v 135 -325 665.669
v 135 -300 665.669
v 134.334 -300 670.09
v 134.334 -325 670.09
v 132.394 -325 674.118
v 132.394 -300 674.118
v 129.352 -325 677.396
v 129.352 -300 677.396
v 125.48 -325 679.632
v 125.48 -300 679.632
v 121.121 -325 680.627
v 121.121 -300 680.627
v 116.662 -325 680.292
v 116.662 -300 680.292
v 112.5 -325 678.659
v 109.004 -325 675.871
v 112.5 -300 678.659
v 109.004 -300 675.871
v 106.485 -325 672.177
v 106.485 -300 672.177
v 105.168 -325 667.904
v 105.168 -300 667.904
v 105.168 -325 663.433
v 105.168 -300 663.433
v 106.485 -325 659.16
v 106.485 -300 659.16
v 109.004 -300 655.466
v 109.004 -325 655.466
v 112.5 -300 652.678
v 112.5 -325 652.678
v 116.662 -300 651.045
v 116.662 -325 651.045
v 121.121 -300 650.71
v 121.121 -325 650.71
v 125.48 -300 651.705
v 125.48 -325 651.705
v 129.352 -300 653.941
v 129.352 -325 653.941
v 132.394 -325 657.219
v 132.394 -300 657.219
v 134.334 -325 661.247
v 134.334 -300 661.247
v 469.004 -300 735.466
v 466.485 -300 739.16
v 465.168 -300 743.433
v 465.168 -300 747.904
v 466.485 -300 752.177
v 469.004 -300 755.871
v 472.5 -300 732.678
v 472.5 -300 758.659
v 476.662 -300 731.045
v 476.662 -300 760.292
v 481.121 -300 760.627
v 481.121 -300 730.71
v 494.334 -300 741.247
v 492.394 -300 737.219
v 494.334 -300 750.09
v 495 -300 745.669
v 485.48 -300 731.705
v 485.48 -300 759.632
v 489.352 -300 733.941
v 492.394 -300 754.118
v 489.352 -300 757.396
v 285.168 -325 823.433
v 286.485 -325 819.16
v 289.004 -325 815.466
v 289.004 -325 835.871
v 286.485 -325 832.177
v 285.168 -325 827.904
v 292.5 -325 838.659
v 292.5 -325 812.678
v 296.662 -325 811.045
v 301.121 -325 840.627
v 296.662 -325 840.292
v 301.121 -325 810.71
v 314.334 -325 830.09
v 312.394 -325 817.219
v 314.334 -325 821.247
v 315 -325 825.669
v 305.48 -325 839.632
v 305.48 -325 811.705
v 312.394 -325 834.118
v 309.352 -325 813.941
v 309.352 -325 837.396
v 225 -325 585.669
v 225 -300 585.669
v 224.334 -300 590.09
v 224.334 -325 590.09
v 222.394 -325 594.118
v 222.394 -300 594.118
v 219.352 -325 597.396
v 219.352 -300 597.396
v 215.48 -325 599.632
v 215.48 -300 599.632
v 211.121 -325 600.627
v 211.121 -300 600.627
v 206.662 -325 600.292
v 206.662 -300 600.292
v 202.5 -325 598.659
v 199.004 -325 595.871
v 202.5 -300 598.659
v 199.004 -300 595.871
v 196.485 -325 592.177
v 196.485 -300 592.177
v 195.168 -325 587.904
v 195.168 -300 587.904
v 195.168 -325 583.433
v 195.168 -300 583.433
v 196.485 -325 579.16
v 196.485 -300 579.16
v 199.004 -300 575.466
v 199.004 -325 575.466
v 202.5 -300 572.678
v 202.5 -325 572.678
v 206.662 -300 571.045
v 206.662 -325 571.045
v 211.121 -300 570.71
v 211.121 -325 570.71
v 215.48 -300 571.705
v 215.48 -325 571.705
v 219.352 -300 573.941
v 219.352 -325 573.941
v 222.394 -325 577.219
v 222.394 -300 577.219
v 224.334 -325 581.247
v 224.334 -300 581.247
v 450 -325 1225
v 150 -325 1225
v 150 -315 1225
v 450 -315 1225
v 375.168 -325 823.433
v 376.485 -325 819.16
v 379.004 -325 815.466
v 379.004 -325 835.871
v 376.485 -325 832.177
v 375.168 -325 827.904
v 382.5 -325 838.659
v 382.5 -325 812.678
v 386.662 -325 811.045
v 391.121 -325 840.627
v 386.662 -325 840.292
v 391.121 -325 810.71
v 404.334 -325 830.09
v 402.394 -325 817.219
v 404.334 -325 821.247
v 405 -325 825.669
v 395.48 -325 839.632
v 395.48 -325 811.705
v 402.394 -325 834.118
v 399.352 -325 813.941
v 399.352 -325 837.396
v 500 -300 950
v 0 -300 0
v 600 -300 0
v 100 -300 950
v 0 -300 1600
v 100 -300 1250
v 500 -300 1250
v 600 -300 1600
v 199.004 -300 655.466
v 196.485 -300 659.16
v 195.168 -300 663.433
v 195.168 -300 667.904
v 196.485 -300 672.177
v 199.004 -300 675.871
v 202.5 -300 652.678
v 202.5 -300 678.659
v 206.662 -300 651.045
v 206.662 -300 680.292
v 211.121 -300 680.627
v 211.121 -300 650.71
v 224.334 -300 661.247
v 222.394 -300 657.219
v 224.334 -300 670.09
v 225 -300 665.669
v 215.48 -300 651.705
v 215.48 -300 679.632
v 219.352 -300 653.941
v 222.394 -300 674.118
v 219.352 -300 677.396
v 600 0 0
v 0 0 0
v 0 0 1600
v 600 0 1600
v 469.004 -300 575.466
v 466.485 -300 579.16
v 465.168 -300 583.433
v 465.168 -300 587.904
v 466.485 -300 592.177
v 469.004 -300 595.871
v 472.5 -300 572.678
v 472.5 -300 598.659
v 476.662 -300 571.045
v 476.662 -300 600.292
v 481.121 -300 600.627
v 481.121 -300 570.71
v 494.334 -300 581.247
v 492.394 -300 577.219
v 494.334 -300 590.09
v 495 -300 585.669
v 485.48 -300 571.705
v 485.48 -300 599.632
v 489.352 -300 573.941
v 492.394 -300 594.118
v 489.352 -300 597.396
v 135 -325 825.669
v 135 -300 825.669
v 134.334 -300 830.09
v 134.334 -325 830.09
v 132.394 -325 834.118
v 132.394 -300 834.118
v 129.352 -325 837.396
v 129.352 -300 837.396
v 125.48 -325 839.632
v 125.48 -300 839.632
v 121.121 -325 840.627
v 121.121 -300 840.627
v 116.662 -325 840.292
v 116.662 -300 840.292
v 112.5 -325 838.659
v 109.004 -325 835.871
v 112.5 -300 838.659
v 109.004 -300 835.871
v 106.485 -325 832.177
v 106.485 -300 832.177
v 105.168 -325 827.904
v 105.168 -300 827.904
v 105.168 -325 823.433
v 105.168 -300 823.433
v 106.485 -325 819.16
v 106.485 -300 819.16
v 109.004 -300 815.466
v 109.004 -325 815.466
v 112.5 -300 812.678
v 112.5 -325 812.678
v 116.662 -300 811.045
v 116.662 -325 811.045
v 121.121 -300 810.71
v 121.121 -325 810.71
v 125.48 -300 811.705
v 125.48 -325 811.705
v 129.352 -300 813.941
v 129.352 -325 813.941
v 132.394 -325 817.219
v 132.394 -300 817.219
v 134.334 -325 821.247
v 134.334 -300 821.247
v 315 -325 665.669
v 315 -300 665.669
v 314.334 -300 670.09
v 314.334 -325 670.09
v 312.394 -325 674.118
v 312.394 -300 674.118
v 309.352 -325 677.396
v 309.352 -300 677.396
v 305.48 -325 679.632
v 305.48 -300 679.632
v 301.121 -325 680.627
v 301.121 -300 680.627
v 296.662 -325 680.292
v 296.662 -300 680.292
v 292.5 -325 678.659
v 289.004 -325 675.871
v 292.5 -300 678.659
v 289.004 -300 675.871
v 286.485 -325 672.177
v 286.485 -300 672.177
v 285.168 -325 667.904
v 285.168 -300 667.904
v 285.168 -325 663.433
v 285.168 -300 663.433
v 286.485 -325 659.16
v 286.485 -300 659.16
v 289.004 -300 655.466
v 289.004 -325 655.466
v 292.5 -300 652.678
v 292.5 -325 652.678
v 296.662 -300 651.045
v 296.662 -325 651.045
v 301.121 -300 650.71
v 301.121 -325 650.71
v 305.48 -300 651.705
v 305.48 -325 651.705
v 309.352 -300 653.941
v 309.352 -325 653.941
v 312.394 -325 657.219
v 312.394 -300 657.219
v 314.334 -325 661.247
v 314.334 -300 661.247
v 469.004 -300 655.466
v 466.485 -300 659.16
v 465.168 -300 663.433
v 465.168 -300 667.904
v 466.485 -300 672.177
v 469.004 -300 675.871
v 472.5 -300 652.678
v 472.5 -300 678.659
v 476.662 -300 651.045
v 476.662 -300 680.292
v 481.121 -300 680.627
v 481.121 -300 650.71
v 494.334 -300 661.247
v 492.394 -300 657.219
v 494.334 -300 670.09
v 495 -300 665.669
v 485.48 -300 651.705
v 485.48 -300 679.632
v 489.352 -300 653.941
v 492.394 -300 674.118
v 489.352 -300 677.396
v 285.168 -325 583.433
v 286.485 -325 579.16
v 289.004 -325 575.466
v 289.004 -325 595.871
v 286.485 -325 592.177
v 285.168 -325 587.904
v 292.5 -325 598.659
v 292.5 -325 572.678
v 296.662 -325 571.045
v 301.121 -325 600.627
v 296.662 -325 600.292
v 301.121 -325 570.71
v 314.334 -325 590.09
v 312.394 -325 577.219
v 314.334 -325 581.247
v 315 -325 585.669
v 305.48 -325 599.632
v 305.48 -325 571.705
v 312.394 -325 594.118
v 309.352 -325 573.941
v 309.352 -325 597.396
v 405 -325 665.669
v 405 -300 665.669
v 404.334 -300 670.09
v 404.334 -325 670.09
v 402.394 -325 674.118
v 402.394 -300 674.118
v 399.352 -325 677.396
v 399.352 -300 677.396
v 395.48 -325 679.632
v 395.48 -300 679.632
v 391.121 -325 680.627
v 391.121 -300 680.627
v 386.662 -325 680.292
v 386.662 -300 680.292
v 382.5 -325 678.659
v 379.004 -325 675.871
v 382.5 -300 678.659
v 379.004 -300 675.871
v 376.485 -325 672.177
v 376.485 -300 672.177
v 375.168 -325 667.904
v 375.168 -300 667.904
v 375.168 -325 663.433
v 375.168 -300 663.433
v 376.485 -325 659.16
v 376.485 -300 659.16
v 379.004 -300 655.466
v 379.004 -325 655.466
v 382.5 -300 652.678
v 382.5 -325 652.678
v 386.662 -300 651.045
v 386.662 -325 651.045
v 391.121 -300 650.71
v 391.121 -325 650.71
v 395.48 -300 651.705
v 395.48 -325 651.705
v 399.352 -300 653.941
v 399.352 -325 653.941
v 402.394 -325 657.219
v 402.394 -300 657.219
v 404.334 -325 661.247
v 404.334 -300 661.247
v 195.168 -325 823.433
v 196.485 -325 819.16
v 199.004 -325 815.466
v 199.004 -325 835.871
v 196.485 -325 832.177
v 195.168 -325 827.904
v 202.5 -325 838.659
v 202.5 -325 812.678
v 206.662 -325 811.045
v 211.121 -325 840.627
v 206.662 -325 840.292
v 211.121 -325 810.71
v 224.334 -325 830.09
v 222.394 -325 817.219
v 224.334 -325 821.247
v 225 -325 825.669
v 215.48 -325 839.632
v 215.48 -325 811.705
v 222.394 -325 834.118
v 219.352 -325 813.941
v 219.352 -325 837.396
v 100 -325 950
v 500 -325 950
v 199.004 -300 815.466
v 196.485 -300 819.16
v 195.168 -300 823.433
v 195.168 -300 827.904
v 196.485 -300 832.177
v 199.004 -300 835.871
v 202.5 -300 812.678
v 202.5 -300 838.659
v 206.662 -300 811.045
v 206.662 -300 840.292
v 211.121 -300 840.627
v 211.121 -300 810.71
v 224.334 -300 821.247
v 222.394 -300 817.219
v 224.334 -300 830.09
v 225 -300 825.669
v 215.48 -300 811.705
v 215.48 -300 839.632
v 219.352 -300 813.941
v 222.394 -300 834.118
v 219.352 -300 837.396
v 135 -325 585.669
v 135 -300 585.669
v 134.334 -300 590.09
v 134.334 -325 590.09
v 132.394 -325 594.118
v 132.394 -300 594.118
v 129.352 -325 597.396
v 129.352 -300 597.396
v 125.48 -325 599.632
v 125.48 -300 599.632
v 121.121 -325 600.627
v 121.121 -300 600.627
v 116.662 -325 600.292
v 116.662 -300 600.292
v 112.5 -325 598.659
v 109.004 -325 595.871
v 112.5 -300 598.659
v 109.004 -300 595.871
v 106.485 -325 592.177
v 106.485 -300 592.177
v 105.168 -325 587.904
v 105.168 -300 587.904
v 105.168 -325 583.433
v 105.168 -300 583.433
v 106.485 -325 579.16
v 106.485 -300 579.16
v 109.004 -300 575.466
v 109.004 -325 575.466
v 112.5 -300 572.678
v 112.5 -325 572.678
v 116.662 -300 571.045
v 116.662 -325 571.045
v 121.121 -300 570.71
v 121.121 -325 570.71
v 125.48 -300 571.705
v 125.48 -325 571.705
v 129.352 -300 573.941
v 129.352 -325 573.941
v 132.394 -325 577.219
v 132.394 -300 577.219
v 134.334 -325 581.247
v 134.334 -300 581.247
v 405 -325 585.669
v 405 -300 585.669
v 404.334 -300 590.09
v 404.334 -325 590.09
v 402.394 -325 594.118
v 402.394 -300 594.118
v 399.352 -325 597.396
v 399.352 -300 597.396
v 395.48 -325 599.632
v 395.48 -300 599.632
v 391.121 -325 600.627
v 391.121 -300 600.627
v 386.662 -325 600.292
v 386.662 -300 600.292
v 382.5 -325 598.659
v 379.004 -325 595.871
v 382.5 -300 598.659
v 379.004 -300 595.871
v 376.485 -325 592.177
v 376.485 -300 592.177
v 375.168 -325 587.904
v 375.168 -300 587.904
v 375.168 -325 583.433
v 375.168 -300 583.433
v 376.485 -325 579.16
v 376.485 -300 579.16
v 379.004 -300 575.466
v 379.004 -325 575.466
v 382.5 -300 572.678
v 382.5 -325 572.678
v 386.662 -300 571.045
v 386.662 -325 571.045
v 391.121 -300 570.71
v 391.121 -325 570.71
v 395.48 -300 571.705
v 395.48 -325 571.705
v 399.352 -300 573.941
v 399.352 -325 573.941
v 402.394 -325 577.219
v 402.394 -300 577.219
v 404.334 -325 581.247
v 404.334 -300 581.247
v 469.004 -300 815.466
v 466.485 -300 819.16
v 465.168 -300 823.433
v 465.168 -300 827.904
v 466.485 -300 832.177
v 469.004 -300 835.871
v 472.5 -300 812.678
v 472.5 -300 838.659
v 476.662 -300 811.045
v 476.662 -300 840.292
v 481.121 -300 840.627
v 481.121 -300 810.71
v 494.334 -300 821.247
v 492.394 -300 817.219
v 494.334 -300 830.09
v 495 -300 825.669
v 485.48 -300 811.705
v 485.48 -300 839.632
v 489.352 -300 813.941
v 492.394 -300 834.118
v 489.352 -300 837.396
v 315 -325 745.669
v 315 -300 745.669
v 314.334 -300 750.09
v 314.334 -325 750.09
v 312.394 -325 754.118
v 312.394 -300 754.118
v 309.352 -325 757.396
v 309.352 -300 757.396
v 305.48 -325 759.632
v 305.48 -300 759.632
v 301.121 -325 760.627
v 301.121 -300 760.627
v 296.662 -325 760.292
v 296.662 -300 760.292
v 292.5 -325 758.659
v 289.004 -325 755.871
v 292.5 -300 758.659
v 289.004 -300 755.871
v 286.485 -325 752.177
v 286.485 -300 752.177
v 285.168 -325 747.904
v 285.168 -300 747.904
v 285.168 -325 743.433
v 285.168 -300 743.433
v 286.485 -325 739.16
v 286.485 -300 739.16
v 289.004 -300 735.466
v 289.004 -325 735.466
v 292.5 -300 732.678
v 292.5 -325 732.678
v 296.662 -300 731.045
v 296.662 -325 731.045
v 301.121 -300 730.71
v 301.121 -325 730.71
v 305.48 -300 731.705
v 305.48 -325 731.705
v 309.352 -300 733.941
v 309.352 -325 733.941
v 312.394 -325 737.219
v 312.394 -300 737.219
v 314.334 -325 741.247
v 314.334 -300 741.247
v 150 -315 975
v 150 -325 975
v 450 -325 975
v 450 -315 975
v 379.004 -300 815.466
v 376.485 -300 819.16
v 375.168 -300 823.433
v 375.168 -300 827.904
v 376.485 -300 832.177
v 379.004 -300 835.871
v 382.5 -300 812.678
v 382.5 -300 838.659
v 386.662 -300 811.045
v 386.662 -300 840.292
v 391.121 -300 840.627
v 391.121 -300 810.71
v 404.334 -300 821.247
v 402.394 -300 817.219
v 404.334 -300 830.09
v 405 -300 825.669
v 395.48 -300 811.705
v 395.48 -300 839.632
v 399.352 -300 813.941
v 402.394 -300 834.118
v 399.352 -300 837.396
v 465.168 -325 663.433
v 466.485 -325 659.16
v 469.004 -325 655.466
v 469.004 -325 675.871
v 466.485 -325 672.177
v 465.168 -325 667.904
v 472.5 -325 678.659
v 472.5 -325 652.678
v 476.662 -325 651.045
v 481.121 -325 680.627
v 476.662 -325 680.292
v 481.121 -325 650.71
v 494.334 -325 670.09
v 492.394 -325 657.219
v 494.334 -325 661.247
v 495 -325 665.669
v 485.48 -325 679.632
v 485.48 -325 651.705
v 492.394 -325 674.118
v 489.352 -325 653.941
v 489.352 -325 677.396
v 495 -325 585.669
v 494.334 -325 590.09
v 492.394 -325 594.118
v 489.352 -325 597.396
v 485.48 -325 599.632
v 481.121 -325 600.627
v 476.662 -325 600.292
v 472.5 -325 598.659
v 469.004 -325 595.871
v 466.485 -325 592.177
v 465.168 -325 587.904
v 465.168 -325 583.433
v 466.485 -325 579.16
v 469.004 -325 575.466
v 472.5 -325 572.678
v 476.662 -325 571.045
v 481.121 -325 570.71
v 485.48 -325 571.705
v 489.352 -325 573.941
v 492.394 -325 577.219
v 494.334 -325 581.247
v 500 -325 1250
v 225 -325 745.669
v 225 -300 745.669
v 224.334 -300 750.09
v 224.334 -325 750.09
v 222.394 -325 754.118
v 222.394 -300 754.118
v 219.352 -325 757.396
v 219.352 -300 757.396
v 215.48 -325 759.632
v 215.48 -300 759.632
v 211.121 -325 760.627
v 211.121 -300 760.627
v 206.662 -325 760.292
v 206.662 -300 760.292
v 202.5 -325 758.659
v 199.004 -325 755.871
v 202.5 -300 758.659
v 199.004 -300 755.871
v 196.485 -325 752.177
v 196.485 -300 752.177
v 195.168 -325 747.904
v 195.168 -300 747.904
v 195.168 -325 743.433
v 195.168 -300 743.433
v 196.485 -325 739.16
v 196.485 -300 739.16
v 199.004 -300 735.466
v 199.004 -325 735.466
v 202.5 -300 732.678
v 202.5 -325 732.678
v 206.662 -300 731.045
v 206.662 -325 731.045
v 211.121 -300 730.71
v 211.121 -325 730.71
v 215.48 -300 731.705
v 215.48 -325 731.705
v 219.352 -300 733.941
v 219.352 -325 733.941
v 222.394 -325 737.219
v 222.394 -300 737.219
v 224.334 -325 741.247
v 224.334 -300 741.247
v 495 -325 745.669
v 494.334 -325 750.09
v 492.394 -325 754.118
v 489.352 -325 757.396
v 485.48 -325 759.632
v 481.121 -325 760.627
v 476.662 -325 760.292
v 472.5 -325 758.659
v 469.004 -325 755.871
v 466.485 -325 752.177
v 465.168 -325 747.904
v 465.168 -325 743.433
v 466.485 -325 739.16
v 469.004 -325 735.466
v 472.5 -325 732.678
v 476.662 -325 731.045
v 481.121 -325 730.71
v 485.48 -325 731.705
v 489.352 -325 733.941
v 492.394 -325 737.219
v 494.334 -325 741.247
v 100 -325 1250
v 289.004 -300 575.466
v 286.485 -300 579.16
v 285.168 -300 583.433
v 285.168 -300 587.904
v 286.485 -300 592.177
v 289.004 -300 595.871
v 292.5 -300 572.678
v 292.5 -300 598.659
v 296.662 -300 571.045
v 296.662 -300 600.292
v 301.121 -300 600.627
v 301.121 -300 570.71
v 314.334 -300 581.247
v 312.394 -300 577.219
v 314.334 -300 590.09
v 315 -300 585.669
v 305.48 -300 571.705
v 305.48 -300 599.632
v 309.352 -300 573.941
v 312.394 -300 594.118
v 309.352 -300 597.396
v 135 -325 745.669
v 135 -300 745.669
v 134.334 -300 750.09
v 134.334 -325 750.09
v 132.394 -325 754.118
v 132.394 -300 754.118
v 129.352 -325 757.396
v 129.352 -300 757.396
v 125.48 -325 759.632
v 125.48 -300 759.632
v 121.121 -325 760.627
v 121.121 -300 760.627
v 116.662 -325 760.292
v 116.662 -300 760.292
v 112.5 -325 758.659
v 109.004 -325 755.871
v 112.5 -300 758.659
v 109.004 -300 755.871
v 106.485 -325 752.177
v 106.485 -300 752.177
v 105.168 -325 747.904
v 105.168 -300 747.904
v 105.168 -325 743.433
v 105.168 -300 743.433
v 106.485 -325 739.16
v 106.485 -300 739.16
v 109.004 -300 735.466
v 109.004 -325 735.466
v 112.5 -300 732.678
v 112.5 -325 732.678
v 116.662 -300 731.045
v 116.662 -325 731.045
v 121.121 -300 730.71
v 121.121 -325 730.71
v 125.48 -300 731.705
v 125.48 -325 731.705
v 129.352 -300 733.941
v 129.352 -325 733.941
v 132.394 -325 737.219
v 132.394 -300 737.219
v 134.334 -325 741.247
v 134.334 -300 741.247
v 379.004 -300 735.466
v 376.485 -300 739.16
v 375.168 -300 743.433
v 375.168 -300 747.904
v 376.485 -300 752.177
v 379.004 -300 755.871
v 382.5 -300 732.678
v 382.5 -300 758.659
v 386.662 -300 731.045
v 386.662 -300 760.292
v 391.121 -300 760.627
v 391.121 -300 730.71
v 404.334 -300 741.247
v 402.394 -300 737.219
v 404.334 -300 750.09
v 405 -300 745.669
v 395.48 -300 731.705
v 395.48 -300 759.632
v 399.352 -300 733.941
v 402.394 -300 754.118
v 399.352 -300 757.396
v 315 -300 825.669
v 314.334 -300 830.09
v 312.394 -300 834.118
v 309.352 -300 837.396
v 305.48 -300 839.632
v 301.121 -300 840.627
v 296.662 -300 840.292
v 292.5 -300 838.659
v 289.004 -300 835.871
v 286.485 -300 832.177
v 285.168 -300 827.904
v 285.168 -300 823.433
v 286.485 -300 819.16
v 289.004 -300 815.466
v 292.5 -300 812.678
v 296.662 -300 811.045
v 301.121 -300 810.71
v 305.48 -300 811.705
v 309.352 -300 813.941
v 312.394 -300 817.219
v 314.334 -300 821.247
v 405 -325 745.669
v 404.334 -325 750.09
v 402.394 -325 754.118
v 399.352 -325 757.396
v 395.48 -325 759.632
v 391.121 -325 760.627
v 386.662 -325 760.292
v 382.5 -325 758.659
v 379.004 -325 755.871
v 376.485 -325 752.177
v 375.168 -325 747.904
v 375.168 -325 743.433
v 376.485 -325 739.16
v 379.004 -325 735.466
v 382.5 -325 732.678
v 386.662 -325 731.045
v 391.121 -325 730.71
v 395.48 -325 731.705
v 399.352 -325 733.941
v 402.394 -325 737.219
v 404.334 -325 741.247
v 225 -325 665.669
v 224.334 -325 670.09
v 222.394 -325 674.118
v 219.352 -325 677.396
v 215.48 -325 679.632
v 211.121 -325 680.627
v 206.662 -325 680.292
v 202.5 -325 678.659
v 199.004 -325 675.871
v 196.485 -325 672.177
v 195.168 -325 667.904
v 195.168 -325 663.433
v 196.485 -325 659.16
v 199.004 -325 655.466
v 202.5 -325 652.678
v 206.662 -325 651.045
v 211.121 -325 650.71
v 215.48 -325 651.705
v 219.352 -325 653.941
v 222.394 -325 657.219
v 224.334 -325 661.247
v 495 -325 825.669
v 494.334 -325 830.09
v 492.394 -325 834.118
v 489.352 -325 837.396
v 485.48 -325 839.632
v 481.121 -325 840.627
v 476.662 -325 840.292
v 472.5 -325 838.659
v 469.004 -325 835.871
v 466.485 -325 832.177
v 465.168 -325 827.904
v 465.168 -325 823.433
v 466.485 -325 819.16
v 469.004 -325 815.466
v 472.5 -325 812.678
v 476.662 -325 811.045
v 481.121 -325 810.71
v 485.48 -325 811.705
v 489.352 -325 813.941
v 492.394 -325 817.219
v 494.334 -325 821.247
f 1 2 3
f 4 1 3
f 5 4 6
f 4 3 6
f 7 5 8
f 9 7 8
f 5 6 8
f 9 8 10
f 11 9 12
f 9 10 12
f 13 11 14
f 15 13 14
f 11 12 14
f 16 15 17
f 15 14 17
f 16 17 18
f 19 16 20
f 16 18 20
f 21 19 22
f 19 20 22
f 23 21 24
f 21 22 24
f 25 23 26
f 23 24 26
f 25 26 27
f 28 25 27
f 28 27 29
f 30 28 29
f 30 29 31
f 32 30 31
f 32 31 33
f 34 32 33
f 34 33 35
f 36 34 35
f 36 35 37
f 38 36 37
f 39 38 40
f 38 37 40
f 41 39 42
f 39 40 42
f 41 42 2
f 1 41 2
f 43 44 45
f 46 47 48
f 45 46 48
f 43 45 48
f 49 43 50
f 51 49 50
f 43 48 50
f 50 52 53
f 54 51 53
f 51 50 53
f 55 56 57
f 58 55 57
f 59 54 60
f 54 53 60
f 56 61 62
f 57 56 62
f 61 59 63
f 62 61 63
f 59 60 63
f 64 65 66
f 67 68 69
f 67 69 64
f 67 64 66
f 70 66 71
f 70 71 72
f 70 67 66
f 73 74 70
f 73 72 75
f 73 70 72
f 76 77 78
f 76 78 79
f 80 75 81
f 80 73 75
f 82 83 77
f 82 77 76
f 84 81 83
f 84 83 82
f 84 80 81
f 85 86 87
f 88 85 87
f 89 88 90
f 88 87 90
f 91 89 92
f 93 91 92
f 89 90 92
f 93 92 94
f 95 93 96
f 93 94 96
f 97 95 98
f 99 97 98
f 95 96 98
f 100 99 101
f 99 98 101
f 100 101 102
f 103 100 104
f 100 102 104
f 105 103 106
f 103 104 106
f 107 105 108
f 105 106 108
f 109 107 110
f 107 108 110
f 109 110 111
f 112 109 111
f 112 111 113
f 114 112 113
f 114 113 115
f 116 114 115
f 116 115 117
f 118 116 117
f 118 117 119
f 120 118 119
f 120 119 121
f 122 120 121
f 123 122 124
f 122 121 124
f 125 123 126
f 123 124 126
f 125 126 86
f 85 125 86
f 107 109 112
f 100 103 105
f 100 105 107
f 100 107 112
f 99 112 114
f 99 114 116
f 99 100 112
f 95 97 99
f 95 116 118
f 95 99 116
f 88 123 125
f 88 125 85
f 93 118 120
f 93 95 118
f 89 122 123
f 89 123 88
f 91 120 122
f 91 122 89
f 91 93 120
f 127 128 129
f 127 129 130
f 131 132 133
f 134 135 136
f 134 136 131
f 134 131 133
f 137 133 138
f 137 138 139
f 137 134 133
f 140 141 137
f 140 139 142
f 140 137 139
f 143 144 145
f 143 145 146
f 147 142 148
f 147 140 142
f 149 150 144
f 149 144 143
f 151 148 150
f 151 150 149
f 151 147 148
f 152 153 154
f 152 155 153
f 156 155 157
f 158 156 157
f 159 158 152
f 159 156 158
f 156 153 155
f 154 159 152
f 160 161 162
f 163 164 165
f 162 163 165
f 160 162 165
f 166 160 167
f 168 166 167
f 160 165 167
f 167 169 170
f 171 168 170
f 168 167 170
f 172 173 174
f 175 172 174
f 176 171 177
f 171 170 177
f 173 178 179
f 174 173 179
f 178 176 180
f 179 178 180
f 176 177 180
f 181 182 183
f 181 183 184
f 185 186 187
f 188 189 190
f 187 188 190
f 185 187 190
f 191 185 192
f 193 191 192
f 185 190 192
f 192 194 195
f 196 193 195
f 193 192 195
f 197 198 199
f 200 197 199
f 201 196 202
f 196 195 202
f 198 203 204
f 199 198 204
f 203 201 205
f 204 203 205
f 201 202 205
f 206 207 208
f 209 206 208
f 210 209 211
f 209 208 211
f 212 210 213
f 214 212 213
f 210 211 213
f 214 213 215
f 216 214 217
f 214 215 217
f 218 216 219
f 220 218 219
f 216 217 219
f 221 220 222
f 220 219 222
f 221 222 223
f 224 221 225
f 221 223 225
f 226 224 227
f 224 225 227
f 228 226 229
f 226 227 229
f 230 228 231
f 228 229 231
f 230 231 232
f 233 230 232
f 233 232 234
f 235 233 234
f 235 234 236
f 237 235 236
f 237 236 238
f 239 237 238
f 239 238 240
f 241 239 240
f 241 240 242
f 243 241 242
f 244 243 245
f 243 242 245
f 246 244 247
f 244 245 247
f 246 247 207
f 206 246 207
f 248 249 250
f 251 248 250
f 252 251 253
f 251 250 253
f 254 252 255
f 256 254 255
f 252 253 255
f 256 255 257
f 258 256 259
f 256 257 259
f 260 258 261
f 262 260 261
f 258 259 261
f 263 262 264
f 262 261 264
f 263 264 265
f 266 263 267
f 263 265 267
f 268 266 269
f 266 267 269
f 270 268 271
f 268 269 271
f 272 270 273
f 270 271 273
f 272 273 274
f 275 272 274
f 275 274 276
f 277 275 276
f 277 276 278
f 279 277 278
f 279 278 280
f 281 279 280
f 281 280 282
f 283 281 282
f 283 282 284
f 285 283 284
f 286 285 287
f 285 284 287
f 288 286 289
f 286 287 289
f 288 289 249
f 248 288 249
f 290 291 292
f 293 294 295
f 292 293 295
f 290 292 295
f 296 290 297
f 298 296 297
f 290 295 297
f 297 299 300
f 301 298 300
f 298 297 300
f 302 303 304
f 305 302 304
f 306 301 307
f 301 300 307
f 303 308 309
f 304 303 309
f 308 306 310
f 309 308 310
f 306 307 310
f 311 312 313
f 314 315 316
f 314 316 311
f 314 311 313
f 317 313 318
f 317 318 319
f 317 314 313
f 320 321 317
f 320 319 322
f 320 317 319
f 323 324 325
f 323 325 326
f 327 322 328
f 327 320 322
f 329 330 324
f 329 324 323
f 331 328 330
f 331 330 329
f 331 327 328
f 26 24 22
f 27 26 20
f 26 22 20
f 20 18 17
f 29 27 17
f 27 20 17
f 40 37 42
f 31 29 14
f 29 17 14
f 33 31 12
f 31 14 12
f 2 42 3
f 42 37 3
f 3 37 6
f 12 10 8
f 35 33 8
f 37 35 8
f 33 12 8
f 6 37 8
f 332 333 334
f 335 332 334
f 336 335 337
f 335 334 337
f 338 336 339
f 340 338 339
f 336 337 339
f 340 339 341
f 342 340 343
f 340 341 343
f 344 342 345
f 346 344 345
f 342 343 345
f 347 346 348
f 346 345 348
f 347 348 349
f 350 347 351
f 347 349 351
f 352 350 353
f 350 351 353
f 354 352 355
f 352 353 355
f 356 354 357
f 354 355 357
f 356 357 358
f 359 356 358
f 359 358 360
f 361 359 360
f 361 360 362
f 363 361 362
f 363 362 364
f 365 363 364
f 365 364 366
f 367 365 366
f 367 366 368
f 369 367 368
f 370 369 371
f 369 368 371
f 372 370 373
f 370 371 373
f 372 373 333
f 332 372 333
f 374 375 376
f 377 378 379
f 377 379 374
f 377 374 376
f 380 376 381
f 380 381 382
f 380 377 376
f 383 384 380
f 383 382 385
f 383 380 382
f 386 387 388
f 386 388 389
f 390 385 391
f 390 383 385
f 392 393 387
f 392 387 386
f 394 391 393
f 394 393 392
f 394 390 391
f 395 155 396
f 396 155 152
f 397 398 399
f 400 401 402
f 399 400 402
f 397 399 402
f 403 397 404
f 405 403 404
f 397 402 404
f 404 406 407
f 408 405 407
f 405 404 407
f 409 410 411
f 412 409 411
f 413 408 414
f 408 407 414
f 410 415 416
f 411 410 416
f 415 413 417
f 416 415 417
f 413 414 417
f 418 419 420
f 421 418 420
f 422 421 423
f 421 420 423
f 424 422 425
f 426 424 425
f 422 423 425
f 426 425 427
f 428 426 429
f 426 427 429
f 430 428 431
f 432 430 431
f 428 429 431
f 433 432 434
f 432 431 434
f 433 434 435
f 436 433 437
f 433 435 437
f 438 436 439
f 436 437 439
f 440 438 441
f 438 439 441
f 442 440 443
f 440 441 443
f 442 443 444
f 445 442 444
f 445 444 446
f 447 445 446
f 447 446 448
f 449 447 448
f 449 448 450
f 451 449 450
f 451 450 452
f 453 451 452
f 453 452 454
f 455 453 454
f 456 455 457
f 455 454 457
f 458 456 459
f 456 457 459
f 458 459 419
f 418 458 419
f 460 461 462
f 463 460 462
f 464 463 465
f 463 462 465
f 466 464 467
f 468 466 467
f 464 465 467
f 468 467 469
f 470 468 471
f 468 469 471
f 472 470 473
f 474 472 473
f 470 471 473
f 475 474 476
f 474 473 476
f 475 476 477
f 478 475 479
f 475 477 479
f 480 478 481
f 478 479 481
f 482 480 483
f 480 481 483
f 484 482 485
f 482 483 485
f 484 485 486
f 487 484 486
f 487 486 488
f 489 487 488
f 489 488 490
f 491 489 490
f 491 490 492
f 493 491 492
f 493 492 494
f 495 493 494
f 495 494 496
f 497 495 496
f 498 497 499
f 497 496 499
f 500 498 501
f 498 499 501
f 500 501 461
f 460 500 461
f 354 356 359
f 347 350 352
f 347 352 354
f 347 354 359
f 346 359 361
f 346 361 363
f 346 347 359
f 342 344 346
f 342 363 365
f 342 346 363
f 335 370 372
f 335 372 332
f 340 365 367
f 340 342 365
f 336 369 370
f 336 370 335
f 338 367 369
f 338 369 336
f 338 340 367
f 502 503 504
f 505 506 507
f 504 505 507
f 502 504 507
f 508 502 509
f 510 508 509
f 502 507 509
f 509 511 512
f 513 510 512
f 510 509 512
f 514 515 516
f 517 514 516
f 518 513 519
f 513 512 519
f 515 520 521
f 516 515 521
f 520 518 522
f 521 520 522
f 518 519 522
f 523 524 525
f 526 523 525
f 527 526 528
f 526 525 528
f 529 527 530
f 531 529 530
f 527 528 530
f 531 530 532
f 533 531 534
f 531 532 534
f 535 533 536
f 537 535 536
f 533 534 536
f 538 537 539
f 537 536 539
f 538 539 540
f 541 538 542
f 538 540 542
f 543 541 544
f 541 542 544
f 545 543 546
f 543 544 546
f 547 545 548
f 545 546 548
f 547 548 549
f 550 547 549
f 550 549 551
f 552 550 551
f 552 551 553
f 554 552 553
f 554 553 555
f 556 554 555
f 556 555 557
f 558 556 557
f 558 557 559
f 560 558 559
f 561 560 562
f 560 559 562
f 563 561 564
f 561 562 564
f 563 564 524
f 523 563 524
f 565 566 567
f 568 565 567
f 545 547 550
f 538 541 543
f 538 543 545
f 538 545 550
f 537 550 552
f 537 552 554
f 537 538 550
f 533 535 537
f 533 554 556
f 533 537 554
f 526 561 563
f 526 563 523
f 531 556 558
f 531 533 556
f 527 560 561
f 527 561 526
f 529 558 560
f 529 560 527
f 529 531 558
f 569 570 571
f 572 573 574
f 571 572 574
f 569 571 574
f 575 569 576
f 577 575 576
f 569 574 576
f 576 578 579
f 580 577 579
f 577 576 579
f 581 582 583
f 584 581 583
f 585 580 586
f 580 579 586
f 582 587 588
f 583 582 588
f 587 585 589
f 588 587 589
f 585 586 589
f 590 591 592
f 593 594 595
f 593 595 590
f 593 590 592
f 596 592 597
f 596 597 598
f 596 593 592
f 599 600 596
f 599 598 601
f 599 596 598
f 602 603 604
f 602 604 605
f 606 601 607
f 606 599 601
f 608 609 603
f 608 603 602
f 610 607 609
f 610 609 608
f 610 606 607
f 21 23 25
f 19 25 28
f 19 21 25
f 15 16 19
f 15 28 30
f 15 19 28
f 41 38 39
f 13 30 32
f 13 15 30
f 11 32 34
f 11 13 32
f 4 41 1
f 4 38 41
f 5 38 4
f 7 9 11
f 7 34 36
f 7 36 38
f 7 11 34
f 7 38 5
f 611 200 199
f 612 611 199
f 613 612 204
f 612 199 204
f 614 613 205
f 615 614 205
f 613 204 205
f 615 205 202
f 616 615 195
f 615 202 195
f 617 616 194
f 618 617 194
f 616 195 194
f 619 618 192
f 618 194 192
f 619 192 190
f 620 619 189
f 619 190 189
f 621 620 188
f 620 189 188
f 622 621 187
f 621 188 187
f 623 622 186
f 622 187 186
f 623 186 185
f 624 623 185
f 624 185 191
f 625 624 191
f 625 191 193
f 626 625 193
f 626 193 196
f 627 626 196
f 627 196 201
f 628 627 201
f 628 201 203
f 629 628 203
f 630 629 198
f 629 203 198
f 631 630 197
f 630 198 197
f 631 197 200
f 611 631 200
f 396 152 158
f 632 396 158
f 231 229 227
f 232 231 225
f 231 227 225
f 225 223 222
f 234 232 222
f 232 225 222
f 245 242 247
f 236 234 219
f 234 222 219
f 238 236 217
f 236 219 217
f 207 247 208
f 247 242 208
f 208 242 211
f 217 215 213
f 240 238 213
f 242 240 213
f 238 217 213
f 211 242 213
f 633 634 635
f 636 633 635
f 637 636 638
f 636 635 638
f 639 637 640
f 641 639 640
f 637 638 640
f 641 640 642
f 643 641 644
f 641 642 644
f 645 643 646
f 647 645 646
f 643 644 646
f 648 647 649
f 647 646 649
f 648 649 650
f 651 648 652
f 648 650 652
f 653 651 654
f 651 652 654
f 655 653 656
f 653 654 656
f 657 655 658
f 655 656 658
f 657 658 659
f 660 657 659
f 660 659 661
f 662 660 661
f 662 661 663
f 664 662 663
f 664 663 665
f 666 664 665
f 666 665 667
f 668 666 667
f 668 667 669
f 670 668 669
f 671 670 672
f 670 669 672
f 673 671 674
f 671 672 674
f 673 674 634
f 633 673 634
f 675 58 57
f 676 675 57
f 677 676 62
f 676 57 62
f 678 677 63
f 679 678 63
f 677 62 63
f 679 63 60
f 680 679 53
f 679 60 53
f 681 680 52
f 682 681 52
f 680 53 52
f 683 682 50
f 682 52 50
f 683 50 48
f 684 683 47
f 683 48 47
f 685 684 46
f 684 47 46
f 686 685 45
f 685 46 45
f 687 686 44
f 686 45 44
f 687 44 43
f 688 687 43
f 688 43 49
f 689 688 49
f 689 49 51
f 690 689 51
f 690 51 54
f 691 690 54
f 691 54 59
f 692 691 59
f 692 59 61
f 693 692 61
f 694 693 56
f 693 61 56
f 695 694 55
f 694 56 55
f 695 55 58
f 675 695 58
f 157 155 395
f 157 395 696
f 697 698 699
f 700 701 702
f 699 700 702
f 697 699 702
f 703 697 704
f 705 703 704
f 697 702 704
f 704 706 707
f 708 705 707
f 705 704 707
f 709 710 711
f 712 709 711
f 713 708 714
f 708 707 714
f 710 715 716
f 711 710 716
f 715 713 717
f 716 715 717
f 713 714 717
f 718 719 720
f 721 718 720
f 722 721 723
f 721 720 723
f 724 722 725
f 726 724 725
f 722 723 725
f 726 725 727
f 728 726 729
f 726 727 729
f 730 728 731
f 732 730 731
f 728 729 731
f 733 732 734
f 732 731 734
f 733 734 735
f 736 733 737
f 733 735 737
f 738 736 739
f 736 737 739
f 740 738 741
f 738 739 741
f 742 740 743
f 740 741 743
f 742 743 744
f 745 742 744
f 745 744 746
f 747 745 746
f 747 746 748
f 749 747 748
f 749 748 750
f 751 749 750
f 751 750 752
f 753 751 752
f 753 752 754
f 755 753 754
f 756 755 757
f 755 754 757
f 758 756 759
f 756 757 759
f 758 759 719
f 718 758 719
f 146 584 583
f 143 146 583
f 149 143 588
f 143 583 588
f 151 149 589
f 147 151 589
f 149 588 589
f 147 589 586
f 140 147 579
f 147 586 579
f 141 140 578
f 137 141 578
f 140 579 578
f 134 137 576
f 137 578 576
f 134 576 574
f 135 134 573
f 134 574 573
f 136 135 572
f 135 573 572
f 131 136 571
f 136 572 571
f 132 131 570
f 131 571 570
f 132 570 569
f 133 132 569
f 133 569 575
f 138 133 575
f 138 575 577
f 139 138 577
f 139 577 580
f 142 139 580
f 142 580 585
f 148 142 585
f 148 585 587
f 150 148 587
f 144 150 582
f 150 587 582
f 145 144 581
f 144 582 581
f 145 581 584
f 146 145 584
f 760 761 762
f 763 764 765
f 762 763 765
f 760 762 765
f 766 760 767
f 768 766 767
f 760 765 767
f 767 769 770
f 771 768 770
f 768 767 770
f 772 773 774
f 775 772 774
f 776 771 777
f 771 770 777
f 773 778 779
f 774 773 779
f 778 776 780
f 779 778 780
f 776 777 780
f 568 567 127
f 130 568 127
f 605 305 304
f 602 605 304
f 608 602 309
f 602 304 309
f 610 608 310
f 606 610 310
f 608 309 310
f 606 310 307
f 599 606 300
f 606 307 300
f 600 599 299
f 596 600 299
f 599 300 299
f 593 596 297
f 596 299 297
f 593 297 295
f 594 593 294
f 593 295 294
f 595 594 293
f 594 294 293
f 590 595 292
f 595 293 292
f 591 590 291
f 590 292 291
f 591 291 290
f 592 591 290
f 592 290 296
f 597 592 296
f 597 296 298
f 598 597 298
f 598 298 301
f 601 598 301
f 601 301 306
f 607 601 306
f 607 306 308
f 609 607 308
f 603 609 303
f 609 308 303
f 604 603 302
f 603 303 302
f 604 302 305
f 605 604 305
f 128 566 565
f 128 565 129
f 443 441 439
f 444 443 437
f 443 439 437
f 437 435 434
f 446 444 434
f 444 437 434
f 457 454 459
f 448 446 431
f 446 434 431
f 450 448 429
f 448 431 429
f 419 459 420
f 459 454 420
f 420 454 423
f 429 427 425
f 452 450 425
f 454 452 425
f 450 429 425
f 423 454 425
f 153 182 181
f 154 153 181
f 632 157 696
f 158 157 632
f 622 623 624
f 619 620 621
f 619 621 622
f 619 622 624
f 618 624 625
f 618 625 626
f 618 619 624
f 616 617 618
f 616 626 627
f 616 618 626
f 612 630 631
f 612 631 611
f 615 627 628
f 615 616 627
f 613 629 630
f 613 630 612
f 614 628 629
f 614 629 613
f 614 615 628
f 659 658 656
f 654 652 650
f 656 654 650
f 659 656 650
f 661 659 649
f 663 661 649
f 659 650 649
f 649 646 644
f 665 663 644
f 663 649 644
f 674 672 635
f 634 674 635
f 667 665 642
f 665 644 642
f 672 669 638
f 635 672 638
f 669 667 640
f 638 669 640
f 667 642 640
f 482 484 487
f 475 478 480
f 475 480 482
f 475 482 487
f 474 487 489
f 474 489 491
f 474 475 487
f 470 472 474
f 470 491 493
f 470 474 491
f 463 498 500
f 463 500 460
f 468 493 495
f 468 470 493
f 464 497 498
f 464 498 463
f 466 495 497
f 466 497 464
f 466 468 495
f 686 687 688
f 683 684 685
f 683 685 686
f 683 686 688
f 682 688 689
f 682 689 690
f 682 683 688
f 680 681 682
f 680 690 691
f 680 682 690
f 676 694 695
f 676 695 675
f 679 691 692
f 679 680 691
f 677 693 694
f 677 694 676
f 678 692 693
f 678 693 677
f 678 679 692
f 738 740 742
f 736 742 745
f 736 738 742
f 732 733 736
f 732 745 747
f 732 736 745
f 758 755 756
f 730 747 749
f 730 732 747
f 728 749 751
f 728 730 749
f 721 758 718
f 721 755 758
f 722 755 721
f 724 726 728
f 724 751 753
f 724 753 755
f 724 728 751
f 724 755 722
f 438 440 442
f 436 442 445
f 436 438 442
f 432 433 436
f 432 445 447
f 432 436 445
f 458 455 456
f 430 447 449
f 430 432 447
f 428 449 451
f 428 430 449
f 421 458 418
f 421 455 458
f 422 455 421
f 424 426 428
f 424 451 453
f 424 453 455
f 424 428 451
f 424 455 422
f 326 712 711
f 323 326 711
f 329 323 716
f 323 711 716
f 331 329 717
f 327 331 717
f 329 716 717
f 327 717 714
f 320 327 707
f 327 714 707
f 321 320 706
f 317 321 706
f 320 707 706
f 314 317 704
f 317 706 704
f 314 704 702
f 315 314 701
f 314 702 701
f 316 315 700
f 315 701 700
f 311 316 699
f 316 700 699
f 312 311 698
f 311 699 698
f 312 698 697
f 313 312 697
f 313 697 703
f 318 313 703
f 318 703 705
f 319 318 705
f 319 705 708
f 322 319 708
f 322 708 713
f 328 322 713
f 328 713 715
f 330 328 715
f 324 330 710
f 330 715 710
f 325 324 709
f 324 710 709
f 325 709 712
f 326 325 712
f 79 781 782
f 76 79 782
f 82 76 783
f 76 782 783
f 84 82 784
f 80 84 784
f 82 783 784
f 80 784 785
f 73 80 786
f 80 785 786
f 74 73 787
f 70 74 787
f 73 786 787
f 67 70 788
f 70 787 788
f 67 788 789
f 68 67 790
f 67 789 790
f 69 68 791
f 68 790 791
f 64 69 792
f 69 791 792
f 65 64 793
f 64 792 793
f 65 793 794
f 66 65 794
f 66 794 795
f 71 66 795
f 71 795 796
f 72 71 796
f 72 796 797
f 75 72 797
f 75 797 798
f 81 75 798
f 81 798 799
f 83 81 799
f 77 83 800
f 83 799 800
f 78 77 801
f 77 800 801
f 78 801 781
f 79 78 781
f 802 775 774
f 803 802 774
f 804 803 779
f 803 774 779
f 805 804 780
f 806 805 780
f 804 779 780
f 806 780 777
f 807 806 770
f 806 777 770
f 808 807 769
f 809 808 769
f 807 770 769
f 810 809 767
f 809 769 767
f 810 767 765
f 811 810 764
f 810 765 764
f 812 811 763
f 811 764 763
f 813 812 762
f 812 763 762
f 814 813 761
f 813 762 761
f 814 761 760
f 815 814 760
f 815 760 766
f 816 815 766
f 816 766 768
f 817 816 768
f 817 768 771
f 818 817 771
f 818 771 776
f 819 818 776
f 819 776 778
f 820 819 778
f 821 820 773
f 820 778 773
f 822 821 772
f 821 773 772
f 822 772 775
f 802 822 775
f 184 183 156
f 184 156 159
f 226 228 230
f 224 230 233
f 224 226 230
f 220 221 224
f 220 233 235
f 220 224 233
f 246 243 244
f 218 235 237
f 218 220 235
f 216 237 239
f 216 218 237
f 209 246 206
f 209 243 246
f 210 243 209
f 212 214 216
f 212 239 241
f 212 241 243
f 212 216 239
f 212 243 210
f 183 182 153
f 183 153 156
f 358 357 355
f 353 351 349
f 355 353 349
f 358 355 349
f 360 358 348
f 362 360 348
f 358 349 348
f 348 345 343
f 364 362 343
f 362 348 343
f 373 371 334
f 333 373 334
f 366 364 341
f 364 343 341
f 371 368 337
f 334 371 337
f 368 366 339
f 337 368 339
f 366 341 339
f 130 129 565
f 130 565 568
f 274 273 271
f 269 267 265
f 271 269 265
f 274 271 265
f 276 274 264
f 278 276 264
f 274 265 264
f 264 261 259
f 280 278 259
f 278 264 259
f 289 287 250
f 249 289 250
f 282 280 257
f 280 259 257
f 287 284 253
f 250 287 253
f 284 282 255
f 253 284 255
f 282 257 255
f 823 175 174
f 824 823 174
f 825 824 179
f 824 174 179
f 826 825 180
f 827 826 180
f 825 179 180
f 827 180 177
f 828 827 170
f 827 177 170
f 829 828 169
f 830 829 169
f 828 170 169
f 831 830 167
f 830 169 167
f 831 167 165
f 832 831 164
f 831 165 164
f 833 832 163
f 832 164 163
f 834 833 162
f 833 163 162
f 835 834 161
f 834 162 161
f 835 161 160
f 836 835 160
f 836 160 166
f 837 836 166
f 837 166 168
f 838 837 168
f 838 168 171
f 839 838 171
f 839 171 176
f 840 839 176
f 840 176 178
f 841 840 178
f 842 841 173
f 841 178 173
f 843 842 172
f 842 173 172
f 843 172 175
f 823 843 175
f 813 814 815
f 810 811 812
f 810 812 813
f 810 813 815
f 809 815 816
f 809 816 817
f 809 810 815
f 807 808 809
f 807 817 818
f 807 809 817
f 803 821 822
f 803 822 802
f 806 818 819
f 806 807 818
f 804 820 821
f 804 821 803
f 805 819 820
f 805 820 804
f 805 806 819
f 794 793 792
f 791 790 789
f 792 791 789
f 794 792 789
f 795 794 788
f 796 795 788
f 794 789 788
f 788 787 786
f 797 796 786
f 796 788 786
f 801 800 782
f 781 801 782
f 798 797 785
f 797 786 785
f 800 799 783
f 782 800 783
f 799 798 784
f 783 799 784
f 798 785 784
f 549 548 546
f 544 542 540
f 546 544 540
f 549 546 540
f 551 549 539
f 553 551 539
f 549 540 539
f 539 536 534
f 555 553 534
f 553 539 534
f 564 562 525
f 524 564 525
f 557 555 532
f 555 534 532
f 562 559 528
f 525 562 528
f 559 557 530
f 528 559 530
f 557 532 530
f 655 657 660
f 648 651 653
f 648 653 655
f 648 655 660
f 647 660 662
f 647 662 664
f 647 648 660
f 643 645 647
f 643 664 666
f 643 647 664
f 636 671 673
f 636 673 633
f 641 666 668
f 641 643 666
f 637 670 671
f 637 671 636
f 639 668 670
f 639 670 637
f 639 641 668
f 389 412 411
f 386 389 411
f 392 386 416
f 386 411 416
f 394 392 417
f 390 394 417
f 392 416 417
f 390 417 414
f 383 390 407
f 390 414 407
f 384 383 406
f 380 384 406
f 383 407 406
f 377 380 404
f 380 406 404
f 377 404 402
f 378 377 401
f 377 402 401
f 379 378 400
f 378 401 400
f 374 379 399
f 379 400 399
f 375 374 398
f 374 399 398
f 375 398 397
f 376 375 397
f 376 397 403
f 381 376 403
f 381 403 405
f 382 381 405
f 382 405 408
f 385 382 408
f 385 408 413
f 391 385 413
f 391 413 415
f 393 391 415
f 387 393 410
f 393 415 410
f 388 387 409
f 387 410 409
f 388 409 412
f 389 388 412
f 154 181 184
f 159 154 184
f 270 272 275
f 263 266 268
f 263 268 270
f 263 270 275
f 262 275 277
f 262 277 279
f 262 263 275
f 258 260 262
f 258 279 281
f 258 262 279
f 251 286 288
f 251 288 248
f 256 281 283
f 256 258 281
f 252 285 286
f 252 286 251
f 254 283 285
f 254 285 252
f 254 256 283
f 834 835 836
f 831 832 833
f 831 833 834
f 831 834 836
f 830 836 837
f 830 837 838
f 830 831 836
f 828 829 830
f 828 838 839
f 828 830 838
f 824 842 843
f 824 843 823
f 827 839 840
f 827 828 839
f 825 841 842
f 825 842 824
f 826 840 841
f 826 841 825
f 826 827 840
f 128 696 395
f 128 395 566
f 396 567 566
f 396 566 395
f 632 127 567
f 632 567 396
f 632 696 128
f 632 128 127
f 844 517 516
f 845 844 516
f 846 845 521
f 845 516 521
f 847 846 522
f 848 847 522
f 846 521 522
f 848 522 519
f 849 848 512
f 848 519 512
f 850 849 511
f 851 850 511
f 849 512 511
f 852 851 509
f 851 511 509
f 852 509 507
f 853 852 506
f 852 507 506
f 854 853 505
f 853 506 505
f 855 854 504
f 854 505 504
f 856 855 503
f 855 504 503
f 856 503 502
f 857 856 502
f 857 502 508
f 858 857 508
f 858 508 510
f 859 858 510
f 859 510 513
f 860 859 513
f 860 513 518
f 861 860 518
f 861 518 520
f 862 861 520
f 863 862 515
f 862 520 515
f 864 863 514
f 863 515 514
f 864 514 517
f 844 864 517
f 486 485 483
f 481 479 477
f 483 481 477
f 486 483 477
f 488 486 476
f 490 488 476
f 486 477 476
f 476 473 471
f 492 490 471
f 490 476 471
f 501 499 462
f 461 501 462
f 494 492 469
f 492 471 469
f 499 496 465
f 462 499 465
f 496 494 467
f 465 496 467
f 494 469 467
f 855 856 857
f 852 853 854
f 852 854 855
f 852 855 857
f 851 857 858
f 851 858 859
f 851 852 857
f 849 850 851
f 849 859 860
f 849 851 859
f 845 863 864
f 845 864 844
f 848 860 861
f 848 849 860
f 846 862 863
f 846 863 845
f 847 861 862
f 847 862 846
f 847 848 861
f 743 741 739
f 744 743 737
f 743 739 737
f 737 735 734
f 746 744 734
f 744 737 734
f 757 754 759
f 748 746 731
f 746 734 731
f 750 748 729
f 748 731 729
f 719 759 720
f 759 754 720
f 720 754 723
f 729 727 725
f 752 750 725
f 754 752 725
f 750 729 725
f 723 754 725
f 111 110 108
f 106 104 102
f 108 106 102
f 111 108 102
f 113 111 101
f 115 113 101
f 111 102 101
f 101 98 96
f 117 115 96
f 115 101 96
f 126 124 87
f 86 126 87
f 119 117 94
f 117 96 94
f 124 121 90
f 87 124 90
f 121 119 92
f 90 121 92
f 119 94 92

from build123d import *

# Parameters (mm, degrees)
F0_W     = 600
F0_H     = 1600
F1_DEPTH = 300
F2_W     = 400
F2_H     = 300
F3_DEPTH = 25
F4_W     = 300
F4_H     = 250
F5_DEPTH = 10
F6_R     = 15
F7_DEPTH = 25


with BuildPart() as f1:
    # F0 (on Front) → F1 (new body)
    with BuildSketch(Plane.XZ):
        with Locations((300, 800)):
            Rectangle(F0_W, F0_H)
    extrude(amount=F1_DEPTH)

    # F2 (on face) → F3 (join)
    with BuildSketch(Plane.XZ.offset(300)):
        with Locations((300, 1100)):
            Rectangle(F2_W, F2_H)
    extrude(amount=F3_DEPTH)

    # F4 (on face) → F5 (cut)
    with BuildSketch(Plane.XZ.offset(325)):
        with Locations((300, 1100)):
            Rectangle(F4_W, F4_H)
    extrude(amount=-F5_DEPTH, mode=Mode.SUBTRACT)


with BuildPart() as f7:
    # F6 (on face) → F7 (new body)
    with BuildSketch(Plane.XZ.offset(300)):
        with Locations((120, 825.668514)):
            Circle(F6_R)
        with Locations((120, 745.668514)):
            Circle(F6_R)
        with Locations((120, 665.668514)):
            Circle(F6_R)
        with Locations((120, 585.668514)):
            Circle(F6_R)
        with Locations((210, 825.668514)):
            Circle(F6_R)
        with Locations((210, 745.668514)):
            Circle(F6_R)
        with Locations((210, 665.668514)):
            Circle(F6_R)
        with Locations((210, 585.668514)):
            Circle(F6_R)
        with Locations((300, 825.668514)):
            Circle(F6_R)
        with Locations((300, 745.668514)):
            Circle(F6_R)
        with Locations((300, 665.668514)):
            Circle(F6_R)
        with Locations((300, 585.668514)):
            Circle(F6_R)
        with Locations((390, 825.668514)):
            Circle(F6_R)
        with Locations((390, 745.668514)):
            Circle(F6_R)
        with Locations((390, 665.668514)):
            Circle(F6_R)
        with Locations((390, 585.668514)):
            Circle(F6_R)
        with Locations((480, 825.668514)):
            Circle(F6_R)
        with Locations((480, 745.668514)):
            Circle(F6_R)
        with Locations((480, 665.668514)):
            Circle(F6_R)
        with Locations((480, 585.668514)):
            Circle(F6_R)
    extrude(amount=F7_DEPTH)


solid = Compound([f1.part, f7.part])
